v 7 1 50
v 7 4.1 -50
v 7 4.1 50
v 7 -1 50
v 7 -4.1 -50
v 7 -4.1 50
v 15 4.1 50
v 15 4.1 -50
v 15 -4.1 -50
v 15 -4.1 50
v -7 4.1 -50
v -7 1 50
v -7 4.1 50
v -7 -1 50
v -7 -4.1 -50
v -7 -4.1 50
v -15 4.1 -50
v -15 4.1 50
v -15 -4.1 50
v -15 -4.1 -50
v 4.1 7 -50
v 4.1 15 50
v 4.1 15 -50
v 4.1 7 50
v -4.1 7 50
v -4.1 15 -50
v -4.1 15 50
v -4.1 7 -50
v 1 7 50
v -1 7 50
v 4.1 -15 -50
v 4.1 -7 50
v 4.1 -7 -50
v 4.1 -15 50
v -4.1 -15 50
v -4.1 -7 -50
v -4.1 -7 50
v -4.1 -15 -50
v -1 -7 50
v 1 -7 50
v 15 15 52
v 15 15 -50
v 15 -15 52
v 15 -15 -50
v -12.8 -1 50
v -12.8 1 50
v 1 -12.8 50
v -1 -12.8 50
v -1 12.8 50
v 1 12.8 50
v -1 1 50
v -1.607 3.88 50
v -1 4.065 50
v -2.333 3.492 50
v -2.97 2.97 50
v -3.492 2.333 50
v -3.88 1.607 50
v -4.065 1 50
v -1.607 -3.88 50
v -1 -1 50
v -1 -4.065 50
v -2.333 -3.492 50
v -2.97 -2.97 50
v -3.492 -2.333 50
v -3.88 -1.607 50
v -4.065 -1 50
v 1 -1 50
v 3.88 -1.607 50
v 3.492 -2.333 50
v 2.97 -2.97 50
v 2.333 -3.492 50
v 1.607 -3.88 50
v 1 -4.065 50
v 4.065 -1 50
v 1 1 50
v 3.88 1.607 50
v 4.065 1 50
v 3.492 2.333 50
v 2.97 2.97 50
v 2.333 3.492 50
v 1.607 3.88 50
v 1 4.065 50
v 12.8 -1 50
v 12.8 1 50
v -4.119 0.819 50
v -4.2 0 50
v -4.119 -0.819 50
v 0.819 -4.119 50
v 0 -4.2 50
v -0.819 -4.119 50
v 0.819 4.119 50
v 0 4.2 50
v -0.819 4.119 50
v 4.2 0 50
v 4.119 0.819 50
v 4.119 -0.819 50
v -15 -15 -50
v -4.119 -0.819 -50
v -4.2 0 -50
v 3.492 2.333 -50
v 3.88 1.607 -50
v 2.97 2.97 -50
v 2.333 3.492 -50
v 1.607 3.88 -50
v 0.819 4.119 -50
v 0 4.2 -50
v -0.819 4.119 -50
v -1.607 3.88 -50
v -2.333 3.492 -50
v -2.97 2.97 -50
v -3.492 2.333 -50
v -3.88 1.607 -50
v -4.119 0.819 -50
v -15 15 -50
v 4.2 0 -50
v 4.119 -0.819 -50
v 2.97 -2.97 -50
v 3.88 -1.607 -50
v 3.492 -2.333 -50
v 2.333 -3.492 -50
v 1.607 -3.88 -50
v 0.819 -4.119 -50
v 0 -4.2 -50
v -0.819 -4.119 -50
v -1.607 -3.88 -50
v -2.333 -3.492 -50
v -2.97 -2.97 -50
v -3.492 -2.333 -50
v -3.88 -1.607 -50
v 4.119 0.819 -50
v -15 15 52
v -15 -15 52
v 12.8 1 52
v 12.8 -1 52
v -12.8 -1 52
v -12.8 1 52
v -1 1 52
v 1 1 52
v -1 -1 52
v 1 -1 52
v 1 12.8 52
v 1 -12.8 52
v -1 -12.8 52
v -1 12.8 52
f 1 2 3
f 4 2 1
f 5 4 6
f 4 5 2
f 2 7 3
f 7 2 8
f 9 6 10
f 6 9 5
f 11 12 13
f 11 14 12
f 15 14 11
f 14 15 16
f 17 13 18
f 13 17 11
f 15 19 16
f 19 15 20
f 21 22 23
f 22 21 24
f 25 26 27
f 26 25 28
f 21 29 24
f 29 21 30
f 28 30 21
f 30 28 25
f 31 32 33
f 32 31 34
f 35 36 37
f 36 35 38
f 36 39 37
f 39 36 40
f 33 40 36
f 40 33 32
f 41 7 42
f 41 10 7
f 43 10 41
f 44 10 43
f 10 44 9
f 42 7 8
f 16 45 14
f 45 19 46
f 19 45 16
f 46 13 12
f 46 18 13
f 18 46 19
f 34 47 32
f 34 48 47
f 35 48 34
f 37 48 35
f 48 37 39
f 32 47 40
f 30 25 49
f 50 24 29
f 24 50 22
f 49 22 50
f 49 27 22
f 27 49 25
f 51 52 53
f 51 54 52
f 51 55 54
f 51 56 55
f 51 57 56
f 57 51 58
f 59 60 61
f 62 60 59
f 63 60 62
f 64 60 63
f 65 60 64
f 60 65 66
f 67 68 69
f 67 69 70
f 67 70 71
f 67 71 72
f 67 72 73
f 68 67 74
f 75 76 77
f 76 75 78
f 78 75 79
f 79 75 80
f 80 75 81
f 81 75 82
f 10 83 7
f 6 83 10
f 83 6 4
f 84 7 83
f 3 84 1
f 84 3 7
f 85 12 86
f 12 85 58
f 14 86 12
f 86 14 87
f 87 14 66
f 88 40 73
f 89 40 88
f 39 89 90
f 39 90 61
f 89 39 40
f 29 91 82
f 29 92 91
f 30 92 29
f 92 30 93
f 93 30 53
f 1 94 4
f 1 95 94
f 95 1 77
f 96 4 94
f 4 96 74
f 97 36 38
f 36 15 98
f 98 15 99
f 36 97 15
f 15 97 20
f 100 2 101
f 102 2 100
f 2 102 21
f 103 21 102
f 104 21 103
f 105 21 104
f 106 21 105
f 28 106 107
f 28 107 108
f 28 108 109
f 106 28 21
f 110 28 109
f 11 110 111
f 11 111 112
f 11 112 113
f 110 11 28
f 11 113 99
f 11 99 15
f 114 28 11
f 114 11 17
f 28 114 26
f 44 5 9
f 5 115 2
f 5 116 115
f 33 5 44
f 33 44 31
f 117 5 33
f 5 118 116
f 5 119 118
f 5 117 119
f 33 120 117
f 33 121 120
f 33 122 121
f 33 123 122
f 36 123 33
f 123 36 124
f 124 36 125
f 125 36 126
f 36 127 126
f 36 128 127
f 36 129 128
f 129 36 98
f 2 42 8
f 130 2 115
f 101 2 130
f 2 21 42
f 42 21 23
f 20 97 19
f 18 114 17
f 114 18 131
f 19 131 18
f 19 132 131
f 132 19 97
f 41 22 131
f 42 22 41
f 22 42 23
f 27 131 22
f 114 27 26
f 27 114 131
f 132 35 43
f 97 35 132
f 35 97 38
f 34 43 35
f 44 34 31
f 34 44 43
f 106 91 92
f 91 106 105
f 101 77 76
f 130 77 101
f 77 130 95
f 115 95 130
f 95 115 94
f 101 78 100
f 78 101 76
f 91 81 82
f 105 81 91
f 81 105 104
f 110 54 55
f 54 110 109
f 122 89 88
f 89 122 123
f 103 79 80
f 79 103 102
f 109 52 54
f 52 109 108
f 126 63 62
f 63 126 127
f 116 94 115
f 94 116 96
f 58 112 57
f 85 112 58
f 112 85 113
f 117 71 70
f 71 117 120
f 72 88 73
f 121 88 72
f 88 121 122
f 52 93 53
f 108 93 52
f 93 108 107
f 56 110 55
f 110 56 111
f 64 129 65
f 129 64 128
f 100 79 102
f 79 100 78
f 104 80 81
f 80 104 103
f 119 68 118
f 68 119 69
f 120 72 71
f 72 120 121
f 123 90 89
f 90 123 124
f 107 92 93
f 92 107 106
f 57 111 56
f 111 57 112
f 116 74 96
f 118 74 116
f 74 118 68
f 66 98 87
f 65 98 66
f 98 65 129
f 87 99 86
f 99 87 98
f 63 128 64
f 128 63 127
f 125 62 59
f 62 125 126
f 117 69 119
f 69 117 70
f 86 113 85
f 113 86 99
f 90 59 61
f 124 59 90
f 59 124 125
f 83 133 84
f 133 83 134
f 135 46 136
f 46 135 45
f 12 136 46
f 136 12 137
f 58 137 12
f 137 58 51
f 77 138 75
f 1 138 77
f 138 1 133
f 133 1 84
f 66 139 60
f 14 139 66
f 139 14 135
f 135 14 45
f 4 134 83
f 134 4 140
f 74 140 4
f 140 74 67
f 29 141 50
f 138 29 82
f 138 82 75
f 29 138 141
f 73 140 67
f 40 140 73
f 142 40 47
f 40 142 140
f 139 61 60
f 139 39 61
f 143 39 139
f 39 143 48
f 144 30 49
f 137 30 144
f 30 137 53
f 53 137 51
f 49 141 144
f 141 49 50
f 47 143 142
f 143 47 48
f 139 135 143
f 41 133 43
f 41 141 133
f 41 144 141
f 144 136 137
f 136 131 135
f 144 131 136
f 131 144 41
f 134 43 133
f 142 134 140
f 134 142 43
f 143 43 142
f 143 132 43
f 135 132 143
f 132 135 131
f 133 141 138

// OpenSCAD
// Parameters
cross_section_width_mm = 30; //[15:60:0.5]
cross_section_height_mm = 30; //[15:60:0.5]
length_mm = 100; //[50:200:1]
center_length = 1; //[0:1:1]
include_corner_holes = 1; //[0:1:1]
wall_thickness_mm = 2.2; //[1.2:4.4:0.1]
slot_opening_width_mm = 8.2; //[5:12:0.1]
slot_depth_mm = 7.5; //[4:12:0.1]
slot_inner_width_mm = 12.0; //[8:18:0.1]
center_bore_diameter_mm = 8.4; //[4:14:0.1]
web_thickness_mm = 2.0; //[1.2:4.0:0.1]
corner_hole_diameter_mm = 4.2; //[2.5:7:0.1]
corner_hole_inset_mm = 6.5; //[4:10:0.1]
overlap_mm = 1.0; //[0.5:2.0:0.1]

// Extrusion - complete detailed geometry
module extrusion() {
  color("Silver") {
    difference() {
      // Main body
      cube([cross_section_width_mm, cross_section_height_mm, length_mm], center=true);
      
      // T-slot channels
      union() {
        translate([cross_section_width_mm/2 - slot_depth_mm/2, 0, 0])
          cube([slot_depth_mm + overlap_mm, slot_opening_width_mm, length_mm + 2*overlap_mm], center=true);
        translate([-cross_section_width_mm/2 + slot_depth_mm/2, 0, 0])
          cube([slot_depth_mm + overlap_mm, slot_opening_width_mm, length_mm + 2*overlap_mm], center=true);
        translate([0, cross_section_height_mm/2 - slot_depth_mm/2, 0])
          cube([slot_opening_width_mm, slot_depth_mm + overlap_mm, length_mm + 2*overlap_mm], center=true);
        translate([0, -cross_section_height_mm/2 + slot_depth_mm/2, 0])
          cube([slot_opening_width_mm, slot_depth_mm + overlap_mm, length_mm + 2*overlap_mm], center=true);
      }
      
      // Center bore
      translate([0, 0, 0])
        cylinder(r=center_bore_diameter_mm/2, h=length_mm + 2*overlap_mm, center=true, $fn=32);
    }
  }
}

// Extrusion Cross Section - complete detailed geometry
module extrusion_cross_section() {
  color("DimGray") {
    difference() {
      // Cross section
      cube([cross_section_width_mm, cross_section_height_mm, web_thickness_mm], center=true);
      
      // Internal webs
      union() {
        translate([0, 0, 0])
          cube([cross_section_width_mm - 2*wall_thickness_mm, web_thickness_mm, length_mm], center=true);
        translate([0, 0, 0])
          cube([web_thickness_mm, cross_section_height_mm - 2*wall_thickness_mm, length_mm], center=true);
      }
    }
  }
}

// Box Corner Profile Section - complete detailed geometry
module box_corner_profile_section() {
  color("Black") {
    cube([wall_thickness_mm, wall_thickness_mm, length_mm], center=true);
  }
}

// Box Corner Profile Sections - complete detailed geometry
module box_corner_profile_sections() {
  color("Black") {
    union() {
      translate([cross_section_width_mm/2 - wall_thickness_mm/2, cross_section_height_mm/2 - wall_thickness_mm/2, 0])
        box_corner_profile_section();
      translate([-cross_section_width_mm/2 + wall_thickness_mm/2, cross_section_height_mm/2 - wall_thickness_mm/2, 0])
        box_corner_profile_section();
      translate([cross_section_width_mm/2 - wall_thickness_mm/2, -cross_section_height_mm/2 + wall_thickness_mm/2, 0])
        box_corner_profile_section();
      translate([-cross_section_width_mm/2 + wall_thickness_mm/2, -cross_section_height_mm/2 + wall_thickness_mm/2, 0])
        box_corner_profile_section();
    }
  }
}

// Assembly
module assembly() {
  extrusion();
  translate([0, 0, length_mm/2 + web_thickness_mm/2]) extrusion_cross_section();
  box_corner_profile_sections();
}

assembly();
